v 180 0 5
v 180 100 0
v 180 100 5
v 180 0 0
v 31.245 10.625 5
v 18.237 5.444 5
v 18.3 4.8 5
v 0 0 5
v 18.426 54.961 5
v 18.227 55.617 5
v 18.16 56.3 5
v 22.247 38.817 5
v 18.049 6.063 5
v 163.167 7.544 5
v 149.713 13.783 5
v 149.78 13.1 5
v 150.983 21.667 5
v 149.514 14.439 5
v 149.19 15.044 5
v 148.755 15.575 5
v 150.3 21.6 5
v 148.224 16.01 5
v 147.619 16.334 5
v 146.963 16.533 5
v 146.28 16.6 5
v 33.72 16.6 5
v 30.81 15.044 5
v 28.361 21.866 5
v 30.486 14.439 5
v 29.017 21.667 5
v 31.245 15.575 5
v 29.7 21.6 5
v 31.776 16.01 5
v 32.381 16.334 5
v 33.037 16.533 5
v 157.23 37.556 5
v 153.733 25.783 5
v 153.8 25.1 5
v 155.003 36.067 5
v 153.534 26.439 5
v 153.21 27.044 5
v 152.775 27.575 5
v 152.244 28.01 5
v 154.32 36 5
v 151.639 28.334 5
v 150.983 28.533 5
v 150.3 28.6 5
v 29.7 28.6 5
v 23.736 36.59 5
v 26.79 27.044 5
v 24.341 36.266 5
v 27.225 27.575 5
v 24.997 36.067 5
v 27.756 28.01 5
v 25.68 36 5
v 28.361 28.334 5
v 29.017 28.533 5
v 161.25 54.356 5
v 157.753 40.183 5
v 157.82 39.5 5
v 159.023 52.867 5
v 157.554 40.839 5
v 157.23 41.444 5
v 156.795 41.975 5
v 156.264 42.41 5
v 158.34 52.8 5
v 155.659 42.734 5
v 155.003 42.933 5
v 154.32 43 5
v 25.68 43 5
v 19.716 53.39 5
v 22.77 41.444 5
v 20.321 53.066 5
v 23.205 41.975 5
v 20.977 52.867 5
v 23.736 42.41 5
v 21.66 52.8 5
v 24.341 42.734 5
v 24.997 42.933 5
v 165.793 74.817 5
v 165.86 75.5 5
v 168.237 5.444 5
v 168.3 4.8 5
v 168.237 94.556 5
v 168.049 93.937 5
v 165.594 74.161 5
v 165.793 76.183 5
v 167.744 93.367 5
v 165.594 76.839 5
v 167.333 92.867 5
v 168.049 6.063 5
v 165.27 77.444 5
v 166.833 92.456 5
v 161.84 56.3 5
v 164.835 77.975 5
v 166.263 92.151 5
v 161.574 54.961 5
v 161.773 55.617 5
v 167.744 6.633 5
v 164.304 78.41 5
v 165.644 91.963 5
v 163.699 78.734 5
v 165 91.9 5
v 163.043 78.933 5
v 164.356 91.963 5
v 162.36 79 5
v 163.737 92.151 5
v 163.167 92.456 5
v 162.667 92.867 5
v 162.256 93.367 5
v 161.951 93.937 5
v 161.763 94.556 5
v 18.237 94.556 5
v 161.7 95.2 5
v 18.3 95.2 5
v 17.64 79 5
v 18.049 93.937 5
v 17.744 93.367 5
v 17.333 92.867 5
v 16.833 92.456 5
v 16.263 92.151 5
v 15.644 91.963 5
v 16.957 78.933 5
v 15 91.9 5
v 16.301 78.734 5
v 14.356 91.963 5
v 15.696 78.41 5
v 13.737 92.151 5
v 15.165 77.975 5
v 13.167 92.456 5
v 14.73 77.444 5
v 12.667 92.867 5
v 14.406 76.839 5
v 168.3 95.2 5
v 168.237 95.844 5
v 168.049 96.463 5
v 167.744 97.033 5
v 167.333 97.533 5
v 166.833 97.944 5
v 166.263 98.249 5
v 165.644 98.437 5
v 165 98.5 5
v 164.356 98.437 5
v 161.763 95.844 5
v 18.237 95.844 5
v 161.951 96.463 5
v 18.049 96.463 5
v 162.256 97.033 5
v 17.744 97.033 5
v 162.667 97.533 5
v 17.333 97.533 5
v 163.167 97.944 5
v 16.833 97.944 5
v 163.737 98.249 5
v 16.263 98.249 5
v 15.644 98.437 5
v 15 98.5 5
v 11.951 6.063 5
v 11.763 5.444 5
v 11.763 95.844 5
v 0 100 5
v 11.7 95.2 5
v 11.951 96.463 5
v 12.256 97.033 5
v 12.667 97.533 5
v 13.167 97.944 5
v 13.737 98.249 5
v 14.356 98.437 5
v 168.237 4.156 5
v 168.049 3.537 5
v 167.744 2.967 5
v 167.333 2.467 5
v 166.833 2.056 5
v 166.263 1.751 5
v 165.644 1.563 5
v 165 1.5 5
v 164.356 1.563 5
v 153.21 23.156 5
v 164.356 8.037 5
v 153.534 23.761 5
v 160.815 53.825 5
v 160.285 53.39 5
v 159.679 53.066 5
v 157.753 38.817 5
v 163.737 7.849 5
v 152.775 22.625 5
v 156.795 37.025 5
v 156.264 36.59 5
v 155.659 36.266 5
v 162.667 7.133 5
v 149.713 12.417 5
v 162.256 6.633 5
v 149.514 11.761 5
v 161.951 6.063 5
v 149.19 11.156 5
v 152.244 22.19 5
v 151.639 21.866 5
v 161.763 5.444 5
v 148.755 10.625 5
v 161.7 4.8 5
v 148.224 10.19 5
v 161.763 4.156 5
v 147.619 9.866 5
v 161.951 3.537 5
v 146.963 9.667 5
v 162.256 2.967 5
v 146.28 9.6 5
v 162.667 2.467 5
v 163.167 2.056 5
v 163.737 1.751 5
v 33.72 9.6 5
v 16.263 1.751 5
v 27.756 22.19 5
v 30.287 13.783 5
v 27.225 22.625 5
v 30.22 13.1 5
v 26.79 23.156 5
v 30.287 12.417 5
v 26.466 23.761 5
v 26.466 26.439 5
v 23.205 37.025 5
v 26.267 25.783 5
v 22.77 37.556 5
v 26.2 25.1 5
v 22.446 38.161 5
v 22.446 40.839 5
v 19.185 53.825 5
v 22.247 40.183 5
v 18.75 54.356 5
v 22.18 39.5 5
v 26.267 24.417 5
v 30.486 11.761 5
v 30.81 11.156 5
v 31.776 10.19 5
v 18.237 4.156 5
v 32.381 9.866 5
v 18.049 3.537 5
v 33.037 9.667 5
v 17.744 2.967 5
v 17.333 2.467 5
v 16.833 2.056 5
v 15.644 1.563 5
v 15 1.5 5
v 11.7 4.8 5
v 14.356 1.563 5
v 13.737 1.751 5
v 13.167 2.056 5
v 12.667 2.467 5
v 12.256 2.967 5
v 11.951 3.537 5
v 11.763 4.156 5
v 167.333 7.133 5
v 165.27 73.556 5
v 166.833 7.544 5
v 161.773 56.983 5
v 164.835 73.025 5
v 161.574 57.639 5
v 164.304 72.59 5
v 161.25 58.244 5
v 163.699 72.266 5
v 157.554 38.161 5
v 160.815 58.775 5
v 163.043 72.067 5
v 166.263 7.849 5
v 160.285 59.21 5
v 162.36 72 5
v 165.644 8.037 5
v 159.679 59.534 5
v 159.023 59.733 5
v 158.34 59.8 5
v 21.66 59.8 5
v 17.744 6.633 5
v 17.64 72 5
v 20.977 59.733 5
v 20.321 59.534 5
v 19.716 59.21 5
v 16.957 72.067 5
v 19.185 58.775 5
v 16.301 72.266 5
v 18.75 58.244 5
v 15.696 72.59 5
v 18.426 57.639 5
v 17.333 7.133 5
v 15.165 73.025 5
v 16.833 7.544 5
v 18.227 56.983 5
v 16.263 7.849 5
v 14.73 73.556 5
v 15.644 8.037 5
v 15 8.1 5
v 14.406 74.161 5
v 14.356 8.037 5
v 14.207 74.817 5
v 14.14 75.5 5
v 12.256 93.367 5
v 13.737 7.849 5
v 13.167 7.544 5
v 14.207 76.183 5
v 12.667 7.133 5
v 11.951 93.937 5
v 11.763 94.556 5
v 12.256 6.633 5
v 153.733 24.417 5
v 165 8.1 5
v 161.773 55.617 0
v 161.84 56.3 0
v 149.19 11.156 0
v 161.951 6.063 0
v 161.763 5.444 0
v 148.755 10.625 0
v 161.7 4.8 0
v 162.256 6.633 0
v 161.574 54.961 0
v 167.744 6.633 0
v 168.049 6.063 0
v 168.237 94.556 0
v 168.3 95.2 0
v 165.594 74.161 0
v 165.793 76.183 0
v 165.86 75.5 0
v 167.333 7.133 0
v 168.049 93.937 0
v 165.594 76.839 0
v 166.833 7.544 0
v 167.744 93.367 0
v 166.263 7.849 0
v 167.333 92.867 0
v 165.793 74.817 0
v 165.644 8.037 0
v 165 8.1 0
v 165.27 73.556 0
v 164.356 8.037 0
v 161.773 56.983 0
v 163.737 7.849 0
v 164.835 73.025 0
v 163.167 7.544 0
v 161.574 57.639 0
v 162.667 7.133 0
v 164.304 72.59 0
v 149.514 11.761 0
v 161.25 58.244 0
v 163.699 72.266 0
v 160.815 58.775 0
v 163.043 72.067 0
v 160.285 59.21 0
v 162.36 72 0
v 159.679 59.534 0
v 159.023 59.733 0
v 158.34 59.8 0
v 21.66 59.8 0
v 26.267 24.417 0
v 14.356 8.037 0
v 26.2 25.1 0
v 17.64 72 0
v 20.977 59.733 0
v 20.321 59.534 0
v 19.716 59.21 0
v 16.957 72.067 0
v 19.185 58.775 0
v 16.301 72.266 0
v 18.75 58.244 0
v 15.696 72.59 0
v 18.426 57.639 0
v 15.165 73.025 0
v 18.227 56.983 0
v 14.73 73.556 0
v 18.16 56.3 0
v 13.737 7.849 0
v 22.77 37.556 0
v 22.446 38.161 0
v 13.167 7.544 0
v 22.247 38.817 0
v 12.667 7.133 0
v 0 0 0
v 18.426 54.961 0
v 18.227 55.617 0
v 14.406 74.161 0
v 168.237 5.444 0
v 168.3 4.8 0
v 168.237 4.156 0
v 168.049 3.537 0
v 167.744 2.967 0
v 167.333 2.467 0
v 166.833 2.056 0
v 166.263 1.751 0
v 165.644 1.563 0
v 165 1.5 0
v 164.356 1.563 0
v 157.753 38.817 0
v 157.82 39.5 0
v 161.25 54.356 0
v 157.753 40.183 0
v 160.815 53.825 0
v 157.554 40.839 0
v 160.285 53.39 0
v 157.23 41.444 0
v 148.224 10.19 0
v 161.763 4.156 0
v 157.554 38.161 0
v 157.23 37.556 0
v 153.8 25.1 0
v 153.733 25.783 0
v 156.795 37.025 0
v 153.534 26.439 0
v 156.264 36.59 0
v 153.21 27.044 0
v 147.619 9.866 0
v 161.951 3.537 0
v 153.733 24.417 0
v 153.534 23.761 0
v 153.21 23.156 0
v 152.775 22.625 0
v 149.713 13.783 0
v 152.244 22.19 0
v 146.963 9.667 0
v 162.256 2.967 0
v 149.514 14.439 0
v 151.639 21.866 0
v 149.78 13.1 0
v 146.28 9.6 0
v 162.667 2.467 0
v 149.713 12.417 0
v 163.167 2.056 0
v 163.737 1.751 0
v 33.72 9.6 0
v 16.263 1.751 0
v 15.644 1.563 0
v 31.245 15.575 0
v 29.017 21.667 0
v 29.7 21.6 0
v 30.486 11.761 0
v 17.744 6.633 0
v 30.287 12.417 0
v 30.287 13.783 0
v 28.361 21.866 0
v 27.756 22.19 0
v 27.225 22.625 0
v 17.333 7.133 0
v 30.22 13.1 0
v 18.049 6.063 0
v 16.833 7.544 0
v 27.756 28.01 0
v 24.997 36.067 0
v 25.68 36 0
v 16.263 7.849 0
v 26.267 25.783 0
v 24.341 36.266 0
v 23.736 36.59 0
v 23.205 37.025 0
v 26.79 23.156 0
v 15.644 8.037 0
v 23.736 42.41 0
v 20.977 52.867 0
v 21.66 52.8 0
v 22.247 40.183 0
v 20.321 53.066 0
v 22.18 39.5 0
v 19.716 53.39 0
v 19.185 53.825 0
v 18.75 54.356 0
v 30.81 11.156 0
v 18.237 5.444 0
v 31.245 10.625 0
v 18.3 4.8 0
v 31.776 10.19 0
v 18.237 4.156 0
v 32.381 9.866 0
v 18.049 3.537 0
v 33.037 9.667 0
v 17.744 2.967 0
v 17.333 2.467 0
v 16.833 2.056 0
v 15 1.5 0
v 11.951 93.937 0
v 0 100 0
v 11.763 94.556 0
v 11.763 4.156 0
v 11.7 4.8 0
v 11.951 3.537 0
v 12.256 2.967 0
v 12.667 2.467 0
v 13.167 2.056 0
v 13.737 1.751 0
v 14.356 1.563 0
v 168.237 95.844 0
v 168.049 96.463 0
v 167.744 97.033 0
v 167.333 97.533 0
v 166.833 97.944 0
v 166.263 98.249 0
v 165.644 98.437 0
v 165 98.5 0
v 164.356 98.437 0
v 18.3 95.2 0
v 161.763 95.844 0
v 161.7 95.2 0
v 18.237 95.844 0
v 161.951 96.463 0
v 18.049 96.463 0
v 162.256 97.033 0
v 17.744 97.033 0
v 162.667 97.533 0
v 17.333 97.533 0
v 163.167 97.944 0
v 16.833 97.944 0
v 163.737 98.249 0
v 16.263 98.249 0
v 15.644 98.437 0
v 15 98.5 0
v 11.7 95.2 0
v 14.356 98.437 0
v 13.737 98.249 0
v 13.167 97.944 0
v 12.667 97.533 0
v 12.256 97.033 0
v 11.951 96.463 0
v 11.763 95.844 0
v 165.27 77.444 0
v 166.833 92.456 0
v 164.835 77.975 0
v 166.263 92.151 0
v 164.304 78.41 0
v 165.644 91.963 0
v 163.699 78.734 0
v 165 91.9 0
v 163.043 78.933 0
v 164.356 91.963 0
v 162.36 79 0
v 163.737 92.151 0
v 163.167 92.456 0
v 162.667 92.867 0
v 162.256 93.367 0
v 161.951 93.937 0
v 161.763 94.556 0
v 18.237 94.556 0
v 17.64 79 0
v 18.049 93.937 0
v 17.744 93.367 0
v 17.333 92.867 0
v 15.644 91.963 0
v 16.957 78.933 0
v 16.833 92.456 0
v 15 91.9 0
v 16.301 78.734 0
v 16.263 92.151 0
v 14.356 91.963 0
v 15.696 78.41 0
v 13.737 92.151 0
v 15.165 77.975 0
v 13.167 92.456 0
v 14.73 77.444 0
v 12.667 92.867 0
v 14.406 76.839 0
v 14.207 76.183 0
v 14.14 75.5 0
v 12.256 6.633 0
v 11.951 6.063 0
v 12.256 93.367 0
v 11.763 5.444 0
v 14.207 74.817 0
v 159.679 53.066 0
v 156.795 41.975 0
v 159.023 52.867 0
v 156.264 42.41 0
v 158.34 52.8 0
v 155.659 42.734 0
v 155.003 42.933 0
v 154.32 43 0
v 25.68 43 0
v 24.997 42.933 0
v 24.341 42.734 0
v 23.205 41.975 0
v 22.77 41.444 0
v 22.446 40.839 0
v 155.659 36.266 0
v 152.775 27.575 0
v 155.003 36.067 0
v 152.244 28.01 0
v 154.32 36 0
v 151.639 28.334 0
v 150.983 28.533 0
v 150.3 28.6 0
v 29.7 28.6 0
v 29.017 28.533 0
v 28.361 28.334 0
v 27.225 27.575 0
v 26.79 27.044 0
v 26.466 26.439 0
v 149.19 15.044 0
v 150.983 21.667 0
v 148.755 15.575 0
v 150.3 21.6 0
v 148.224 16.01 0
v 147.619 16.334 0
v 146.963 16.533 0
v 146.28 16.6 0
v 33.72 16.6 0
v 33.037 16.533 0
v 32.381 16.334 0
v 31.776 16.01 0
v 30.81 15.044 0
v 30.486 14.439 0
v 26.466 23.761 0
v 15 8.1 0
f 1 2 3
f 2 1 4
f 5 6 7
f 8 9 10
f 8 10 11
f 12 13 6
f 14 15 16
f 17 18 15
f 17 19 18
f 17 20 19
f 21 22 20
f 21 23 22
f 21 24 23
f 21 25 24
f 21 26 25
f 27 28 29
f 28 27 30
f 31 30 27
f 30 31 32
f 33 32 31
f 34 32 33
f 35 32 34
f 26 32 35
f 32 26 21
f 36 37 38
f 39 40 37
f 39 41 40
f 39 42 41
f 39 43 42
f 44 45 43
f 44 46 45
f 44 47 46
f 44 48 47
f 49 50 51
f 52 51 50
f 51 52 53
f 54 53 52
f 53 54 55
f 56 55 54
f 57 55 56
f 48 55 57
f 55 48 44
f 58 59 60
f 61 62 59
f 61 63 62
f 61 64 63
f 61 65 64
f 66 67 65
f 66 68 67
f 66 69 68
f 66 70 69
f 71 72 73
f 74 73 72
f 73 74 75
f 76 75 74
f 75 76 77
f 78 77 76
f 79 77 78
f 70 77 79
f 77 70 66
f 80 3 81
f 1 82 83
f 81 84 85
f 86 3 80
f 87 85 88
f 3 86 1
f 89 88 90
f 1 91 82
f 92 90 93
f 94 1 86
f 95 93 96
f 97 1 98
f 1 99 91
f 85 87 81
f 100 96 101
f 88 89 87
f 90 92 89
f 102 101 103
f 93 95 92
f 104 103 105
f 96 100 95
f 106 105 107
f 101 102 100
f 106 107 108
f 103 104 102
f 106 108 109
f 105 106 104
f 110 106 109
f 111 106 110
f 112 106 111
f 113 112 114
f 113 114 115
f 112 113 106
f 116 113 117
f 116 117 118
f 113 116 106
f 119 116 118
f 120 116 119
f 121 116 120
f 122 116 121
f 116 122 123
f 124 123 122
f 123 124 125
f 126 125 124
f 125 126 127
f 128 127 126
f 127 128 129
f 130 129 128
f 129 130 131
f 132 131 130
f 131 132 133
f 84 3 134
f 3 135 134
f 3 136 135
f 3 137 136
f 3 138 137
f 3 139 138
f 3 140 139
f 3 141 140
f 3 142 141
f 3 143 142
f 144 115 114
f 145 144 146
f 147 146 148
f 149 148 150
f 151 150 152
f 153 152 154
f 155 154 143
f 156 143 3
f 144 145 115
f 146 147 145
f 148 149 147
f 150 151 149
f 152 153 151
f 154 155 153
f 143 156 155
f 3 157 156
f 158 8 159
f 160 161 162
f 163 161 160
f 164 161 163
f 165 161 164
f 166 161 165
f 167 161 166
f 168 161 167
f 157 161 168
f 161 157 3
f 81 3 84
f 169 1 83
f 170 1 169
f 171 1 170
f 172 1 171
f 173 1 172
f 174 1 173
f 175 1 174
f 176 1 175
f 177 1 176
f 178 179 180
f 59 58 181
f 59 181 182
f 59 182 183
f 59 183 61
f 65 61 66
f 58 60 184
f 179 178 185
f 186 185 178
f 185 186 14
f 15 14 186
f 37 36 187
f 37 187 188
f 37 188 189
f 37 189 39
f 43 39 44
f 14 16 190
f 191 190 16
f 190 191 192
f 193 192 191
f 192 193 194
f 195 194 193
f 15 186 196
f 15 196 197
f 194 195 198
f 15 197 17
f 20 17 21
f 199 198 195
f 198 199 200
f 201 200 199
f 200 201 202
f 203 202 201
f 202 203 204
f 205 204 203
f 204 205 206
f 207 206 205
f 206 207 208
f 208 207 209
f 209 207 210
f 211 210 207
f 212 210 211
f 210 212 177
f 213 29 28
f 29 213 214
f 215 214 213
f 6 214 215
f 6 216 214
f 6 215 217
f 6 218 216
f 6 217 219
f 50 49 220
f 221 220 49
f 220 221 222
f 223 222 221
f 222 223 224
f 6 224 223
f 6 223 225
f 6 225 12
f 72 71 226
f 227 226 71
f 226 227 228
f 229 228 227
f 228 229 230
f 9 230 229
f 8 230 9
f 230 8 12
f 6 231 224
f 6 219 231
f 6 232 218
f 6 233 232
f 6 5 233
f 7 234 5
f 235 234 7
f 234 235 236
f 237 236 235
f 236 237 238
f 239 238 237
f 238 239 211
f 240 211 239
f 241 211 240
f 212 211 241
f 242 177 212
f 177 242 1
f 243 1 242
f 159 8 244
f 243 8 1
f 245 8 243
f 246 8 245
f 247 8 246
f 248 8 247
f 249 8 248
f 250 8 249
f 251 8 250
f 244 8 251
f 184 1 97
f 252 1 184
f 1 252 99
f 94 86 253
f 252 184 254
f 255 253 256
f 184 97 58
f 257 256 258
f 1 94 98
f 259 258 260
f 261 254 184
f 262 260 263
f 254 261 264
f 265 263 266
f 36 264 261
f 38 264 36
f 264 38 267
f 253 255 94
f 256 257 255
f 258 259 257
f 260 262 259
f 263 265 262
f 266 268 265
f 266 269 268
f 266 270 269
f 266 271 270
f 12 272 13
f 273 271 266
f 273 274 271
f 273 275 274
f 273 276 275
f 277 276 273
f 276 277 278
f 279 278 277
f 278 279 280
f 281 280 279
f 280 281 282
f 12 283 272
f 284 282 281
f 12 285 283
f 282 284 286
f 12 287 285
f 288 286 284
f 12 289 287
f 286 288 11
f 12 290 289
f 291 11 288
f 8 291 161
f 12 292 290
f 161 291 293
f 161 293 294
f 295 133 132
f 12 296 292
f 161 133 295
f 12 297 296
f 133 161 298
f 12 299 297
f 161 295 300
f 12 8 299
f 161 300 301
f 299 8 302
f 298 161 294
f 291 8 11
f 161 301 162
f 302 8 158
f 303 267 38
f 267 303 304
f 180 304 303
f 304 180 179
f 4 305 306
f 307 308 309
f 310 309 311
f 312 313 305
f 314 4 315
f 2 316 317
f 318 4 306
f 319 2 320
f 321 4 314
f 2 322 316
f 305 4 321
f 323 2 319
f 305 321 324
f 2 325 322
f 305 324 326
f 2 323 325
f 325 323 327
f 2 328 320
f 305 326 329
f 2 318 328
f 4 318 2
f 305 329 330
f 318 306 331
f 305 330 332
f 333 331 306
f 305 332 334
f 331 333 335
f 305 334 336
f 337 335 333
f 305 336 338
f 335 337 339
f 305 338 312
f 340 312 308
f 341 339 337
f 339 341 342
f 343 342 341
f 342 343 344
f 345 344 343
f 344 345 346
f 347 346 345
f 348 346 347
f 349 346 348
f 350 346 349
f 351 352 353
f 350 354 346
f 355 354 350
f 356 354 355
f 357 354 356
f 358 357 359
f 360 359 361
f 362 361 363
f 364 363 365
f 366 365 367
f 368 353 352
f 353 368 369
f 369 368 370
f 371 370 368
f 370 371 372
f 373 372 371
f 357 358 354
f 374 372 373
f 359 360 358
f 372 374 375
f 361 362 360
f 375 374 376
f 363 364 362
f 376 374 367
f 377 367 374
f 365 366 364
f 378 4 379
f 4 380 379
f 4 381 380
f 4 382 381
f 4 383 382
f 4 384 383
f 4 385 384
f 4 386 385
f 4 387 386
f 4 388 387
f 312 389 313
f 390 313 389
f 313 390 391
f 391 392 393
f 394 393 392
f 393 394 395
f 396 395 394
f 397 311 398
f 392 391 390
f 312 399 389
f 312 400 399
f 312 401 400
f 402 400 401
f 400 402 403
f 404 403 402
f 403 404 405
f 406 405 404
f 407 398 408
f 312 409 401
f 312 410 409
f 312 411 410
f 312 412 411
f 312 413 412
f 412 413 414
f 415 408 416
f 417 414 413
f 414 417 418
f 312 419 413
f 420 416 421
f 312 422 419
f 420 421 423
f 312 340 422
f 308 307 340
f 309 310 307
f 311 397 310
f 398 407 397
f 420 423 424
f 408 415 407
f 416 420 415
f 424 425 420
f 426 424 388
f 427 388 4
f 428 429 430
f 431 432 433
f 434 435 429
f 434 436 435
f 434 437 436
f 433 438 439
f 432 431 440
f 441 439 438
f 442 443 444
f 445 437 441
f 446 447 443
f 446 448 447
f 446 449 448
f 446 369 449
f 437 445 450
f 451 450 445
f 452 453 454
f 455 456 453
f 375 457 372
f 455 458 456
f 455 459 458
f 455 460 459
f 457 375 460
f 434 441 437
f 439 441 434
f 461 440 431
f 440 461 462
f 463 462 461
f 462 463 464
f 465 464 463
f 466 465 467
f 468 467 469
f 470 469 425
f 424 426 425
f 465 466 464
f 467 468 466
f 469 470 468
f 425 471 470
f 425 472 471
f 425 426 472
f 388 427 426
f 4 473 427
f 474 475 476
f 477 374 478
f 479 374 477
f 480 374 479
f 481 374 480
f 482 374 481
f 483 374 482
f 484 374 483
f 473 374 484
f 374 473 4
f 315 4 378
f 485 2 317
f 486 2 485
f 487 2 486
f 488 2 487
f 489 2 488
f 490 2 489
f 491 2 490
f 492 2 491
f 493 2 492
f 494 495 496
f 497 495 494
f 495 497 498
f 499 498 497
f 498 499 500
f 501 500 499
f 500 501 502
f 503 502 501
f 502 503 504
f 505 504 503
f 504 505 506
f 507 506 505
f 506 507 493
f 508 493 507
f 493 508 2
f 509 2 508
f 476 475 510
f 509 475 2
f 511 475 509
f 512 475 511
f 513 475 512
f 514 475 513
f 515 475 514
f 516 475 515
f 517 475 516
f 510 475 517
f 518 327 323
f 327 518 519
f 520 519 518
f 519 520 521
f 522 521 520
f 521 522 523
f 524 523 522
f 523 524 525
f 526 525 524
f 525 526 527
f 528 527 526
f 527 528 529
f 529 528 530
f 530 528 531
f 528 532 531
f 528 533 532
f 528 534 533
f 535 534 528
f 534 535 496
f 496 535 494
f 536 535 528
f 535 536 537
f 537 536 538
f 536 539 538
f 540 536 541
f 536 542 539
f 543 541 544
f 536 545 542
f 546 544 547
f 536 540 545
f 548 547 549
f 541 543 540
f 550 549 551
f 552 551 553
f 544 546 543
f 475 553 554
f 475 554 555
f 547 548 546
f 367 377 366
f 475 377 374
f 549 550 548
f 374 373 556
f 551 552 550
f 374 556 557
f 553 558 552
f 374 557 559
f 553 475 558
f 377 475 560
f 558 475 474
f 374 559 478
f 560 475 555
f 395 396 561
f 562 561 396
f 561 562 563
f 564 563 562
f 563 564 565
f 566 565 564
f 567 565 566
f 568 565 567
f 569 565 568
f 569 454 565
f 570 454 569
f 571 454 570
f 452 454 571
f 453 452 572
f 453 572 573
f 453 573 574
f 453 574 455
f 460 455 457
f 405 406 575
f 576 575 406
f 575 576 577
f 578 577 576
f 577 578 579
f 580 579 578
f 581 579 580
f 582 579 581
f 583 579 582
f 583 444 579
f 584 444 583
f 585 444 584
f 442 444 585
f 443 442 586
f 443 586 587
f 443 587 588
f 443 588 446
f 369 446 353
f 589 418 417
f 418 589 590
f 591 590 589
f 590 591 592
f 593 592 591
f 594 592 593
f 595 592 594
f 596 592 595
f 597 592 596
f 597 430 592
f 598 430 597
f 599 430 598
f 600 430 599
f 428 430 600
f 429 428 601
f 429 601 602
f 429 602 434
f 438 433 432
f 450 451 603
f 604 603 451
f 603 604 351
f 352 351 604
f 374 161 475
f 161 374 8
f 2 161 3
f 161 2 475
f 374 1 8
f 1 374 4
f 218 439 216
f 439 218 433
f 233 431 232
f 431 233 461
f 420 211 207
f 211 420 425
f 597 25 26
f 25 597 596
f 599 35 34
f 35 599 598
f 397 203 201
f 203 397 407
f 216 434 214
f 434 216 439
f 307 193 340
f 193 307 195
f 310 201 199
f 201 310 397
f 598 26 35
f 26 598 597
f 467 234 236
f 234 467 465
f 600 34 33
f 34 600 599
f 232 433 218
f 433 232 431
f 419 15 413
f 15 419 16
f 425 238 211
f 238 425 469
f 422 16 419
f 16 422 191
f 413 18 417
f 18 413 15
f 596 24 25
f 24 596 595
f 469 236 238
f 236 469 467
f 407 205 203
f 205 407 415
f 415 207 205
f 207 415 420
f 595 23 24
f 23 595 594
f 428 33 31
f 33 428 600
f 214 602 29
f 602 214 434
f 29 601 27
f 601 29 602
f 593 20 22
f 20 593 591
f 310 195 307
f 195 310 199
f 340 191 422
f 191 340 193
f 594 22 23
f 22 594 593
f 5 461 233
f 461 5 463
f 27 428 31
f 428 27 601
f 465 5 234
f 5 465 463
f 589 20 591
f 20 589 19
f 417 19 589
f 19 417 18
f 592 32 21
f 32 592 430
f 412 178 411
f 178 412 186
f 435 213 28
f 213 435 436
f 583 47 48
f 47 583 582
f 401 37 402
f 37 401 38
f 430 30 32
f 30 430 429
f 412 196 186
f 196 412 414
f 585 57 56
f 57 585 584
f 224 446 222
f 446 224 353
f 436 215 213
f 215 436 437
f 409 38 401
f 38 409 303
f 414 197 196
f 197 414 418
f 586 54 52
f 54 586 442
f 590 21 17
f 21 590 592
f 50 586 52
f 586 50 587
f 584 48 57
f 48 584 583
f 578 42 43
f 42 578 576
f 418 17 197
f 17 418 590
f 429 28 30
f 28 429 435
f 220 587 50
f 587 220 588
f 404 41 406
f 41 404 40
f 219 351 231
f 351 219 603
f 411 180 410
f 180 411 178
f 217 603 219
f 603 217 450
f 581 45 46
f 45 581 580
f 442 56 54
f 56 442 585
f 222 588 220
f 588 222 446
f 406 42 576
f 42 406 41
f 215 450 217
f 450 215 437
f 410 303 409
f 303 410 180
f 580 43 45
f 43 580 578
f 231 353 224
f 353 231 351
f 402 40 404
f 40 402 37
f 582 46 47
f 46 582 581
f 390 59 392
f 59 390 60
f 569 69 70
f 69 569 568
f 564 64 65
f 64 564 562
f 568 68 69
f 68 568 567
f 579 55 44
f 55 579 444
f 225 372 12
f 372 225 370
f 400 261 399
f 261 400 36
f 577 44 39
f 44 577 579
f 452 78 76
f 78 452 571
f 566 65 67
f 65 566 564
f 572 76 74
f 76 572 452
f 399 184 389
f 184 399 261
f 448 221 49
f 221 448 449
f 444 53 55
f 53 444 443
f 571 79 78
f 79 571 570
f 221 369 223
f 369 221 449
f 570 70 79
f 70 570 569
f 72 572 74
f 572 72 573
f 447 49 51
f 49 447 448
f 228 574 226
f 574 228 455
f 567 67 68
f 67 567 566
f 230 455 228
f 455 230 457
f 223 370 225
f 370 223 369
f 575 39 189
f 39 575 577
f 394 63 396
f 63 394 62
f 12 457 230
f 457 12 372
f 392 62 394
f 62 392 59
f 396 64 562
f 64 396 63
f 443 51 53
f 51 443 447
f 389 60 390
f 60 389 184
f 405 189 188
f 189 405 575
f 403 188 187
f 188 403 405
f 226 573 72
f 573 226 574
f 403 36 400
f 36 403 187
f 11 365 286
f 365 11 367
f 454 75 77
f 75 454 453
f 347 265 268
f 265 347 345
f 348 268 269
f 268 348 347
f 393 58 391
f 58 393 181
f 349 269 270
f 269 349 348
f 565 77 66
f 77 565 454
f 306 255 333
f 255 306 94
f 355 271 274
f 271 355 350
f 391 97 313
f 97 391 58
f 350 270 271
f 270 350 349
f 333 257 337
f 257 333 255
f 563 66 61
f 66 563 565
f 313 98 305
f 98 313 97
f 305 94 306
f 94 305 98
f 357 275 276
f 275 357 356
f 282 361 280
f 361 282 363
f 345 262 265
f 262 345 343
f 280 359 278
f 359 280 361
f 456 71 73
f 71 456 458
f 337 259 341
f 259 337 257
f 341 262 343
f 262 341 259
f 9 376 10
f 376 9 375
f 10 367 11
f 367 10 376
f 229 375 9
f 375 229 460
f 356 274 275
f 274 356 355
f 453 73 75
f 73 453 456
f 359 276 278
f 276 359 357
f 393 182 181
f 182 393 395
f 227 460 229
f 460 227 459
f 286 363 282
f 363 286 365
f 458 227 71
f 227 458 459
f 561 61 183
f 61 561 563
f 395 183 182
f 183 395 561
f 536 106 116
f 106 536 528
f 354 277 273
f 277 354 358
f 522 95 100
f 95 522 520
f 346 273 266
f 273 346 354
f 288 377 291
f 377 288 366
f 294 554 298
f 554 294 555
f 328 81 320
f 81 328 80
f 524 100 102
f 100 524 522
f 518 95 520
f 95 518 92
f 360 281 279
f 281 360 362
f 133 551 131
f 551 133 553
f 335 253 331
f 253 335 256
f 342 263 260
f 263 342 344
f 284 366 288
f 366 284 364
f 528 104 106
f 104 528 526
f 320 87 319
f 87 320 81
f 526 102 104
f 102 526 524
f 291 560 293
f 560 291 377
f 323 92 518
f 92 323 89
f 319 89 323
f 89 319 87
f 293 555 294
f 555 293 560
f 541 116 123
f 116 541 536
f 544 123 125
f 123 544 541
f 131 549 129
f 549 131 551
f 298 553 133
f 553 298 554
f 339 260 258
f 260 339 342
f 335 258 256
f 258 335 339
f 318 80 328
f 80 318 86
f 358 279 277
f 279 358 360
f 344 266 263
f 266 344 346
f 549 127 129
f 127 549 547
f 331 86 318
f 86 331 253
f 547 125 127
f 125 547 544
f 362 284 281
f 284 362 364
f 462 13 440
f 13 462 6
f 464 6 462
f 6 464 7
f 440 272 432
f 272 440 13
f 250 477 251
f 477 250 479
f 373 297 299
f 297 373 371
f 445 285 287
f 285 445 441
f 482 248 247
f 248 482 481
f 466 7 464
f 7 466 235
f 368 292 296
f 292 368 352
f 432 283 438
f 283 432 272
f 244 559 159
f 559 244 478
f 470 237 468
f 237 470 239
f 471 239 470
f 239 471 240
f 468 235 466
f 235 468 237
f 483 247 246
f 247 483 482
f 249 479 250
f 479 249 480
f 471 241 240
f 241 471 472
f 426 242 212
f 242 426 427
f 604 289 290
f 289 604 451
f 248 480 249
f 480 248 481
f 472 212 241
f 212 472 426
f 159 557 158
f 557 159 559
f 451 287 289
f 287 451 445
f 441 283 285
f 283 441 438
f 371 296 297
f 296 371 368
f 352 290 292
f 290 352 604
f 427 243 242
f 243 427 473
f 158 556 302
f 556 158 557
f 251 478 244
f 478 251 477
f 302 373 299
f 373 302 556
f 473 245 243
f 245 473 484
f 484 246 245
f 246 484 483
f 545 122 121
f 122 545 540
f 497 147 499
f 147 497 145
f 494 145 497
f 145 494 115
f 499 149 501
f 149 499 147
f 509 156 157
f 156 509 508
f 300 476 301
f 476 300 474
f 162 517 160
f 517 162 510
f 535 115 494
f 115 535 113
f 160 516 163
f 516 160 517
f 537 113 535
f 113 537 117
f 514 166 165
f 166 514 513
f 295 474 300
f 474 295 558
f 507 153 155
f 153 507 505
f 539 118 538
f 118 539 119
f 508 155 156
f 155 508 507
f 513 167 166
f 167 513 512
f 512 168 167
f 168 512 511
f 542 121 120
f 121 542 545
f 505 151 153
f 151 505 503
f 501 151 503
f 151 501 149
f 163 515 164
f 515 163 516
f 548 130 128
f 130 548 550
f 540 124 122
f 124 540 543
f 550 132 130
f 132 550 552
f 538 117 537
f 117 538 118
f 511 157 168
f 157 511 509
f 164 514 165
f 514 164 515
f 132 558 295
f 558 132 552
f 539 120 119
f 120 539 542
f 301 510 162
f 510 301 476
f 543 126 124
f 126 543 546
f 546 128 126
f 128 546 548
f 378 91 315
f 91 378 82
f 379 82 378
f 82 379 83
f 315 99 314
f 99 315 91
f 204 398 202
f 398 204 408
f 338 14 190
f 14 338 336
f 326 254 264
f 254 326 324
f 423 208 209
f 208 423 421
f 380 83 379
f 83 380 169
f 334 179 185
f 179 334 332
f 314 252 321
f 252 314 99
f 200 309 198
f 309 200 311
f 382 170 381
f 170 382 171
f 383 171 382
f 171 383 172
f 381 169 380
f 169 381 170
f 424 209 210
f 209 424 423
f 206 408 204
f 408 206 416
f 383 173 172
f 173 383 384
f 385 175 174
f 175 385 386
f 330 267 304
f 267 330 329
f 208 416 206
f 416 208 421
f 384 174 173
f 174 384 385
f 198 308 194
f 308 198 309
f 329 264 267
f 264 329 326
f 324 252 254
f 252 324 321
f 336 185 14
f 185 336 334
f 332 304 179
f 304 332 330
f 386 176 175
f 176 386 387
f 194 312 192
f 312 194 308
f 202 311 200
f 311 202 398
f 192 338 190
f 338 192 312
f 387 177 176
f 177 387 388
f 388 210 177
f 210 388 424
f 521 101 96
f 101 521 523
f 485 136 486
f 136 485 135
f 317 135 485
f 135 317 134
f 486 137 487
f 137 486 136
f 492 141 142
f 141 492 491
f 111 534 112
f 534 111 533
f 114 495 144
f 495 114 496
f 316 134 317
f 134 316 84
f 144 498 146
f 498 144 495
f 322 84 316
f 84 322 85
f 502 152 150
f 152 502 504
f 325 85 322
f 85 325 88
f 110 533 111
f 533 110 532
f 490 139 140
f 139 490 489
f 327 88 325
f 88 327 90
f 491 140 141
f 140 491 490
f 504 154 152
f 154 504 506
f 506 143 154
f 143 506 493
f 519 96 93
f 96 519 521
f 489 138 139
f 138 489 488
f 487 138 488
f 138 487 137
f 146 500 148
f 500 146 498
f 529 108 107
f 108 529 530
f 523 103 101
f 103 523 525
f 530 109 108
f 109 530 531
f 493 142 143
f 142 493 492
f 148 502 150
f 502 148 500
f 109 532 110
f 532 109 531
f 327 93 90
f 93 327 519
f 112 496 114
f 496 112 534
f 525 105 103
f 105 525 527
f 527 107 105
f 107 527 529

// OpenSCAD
$fn = 32;

// ----------------------------------------------------------------------
// Slotted panel: 180 x 100 mm, 5 рядов of slots
// ----------------------------------------------------------------------

// --- parameters (mm) ---
panel_w = 180;            // panel width
panel_d = 100;            // panel depth
thick = 5;                // panel thickness
slot_w = 7;               // slot width
pitch0 = 12;              // first row pitch
pitch_step = 2.4;         // pitch increase per row
margin = 9.6;             // margin around the slot field
rows = 5;                 // number of slot rows
mount_d = 6.6;            // mounting holes
mount_x = 75;             // mounting hole offset

difference() {
  union() {
    cube([panel_w, panel_d, thick]);
  }
  /* slot rows: stadium shaped cutters, 2.5 mm clear of both faces */
  /* row 0: pitch 12, length 112.56 */
  hull() {
    translate([33.72, 13.1, -2.5]) cylinder(h = thick + 5, d = slot_w);
    translate([146.28, 13.1, -2.5]) cylinder(h = thick + 5, d = slot_w);
  }
  /* row 1: pitch 14.4, length 120.6 */
  hull() {
    translate([29.7, 25.1, -2.5]) cylinder(h = thick + 5, d = slot_w);
    translate([150.3, 25.1, -2.5]) cylinder(h = thick + 5, d = slot_w);
  }
  /* row 2: pitch 16.8, length 128.64 */
  hull() {
    translate([25.68, 39.5, -2.5]) cylinder(h = thick + 5, d = slot_w);
    translate([154.32, 39.5, -2.5]) cylinder(h = thick + 5, d = slot_w);
  }
  /* row 3: pitch 19.2, length 136.68 */
  hull() {
    translate([21.66, 56.3, -2.5]) cylinder(h = thick + 5, d = slot_w);
    translate([158.34, 56.3, -2.5]) cylinder(h = thick + 5, d = slot_w);
  }
  /* row 4: pitch 21.6, length 144.72 */
  hull() {
    translate([17.64, 75.5, -2.5]) cylinder(h = thick + 5, d = slot_w);
    translate([162.36, 75.5, -2.5]) cylinder(h = thick + 5, d = slot_w);
  }
  translate([15, 4.8, -2.5]) cylinder(h = 10, d = mount_d);
  translate([15, 95.2, -2.5]) cylinder(h = 10, d = mount_d);
  translate([165, 4.8, -2.5]) cylinder(h = 10, d = mount_d);
  translate([165, 95.2, -2.5]) cylinder(h = 10, d = mount_d);
}
